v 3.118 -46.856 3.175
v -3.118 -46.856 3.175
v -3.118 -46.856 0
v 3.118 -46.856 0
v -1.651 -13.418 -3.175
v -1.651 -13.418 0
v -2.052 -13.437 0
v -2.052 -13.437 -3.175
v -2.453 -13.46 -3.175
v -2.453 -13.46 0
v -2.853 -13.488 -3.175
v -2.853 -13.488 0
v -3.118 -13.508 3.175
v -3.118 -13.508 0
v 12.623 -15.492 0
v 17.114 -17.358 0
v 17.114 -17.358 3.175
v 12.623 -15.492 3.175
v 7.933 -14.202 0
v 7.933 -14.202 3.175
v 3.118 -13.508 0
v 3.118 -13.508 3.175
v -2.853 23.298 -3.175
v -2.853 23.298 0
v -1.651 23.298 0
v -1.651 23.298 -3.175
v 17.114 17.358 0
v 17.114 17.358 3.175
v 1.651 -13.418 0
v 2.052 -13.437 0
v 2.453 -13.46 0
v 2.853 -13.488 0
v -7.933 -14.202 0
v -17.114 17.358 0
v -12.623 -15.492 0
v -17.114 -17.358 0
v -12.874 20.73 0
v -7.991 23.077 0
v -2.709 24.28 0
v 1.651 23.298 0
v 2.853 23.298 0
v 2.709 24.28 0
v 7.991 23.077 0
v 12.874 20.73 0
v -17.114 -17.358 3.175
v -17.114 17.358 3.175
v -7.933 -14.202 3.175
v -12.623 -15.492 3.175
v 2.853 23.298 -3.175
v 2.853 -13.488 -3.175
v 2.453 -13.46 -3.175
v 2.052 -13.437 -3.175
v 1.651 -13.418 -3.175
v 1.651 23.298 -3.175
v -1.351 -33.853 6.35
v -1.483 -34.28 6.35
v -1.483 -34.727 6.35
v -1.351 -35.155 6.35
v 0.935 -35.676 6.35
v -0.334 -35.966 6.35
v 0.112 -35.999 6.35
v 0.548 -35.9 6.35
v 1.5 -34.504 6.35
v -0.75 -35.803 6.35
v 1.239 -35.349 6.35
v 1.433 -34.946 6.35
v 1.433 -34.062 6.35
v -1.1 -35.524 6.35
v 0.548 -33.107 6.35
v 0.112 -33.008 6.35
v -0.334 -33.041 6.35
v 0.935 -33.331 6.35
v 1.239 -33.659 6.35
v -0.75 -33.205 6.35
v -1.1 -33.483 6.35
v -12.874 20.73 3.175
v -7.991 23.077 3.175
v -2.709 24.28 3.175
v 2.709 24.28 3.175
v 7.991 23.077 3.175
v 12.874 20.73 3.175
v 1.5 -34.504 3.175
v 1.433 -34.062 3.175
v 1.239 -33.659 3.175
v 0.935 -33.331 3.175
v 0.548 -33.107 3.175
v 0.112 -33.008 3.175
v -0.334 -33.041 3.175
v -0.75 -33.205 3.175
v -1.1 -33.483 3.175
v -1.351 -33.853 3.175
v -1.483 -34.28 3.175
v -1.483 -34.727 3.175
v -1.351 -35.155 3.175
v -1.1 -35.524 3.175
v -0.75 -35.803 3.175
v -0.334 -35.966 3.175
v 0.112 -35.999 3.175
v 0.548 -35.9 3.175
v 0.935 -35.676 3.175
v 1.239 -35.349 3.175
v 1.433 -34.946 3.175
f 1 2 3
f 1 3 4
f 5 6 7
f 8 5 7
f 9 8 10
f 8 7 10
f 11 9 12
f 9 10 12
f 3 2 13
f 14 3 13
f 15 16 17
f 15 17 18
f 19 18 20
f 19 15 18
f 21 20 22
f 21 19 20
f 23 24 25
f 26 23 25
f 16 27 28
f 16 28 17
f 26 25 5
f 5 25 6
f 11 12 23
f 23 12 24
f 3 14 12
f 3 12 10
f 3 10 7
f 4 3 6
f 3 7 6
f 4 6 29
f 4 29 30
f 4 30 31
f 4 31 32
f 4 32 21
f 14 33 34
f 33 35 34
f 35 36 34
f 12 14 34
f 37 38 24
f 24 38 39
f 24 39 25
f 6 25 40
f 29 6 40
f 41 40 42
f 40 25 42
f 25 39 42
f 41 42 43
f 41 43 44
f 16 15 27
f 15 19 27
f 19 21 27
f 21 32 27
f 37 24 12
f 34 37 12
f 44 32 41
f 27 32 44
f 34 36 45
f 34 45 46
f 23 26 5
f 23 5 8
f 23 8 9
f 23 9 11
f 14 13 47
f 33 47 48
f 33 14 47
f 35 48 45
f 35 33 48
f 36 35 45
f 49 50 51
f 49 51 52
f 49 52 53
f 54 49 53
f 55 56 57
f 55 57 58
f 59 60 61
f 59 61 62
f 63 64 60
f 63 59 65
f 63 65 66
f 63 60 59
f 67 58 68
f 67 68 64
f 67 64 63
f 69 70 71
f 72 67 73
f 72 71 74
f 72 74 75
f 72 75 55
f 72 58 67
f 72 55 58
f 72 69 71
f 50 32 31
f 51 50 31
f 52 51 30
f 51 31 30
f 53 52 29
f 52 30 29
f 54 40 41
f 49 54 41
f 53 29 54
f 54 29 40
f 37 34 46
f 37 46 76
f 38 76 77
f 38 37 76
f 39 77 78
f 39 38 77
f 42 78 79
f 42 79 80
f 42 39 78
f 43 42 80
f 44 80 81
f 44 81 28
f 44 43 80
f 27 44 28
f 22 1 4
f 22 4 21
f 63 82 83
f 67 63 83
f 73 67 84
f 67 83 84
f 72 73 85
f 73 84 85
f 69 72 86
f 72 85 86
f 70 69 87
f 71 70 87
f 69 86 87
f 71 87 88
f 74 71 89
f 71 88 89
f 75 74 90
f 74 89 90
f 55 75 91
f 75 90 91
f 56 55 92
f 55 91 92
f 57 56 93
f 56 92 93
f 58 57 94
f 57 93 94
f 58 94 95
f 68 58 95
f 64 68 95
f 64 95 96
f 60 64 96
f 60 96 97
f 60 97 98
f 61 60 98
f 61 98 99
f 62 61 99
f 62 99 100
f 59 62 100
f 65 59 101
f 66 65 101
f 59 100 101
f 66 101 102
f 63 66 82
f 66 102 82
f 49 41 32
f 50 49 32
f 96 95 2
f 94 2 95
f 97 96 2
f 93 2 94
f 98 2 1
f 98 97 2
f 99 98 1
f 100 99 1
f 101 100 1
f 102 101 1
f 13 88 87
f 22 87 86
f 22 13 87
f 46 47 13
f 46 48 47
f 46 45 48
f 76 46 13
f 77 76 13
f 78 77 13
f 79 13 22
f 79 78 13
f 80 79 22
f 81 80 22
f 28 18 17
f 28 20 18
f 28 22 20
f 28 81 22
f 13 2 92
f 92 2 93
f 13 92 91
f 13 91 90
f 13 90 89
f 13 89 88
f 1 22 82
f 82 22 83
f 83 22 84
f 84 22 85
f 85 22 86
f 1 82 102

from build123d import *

# Parameters (mm, degrees)
BOSS_EXTRUDE1_DEPTH = 3.175
BOSS_EXTRUDE2_DEPTH = 3.175
SKETCH3_W           = 6.236959702
SKETCH3_H           = 47.194711522
BOSS_EXTRUDE3_DEPTH = 3.175
SKETCH4_R           = 1.5
BOSS_EXTRUDE4_DEPTH = 3.175


with BuildPart() as part:
    # Sketch1 → Boss-Extrude1 (new body)
    with BuildSketch(Plane.XY):
        with BuildLine():
            Line((-17.114253333, -17.357583949), (-17.114253333, 17.357583949))
            ThreePointArc((-17.114253333, 17.357583949), (0, 24.432200125), (17.114253333, 17.357583949))
            Line((17.114253333, 17.357583949), (17.114253333, -17.357583949))
            ThreePointArc((17.114253333, -17.357583949), (0, -13.382802691), (-17.114253333, -17.357583949))
        make_face()
    extrude(amount=BOSS_EXTRUDE1_DEPTH)

    # Sketch2 → Boss-Extrude2 (add)
    with BuildSketch(Plane(origin=(0, 0, 0), x_dir=(-1, 0, 0), z_dir=(0, 0, -1))):
        with BuildLine():
            Line((-1.65128862, -13.417928303), (-1.65128862, 22.268343179))
            Line((-1.65128862, 22.268343179), (-1.65128862, 23.29835294))
            Line((-1.65128862, 23.29835294), (-2.853426735, 23.29835294))
            Line((-2.853426735, 23.29835294), (-2.853426735, -13.48778167))
            ThreePointArc((-2.853426735, -13.48778167), (-2.25262846, -13.448194961), (-1.65128862, -13.417928303))
        make_face()
        with BuildLine():
            Line((1.65128862, 23.29835294), (1.65128862, 22.268343179))
            Line((1.65128862, 22.268343179), (1.65128862, -13.417928303))
            ThreePointArc((1.65128862, -13.417928303), (2.25262846, -13.448194961), (2.853426735, -13.48778167))
            Line((2.853426735, -13.48778167), (2.853426735, 23.29835294))
            Line((2.853426735, 23.29835294), (1.65128862, 23.29835294))
        make_face()
    extrude(amount=BOSS_EXTRUDE2_DEPTH)

    # Sketch3 → Boss-Extrude3 (add)
    with BuildSketch(Plane.XY.offset(3.175)):
        with Locations((0, -23.258467244)):
            Rectangle(SKETCH3_W, SKETCH3_H)
    extrude(amount=-BOSS_EXTRUDE3_DEPTH)

    # Sketch4 → Boss-Extrude4 (add)
    with BuildSketch(Plane.XY.offset(3.175)):
        with Locations((0, -34.503683415)):
            Circle(SKETCH4_R)
    extrude(amount=BOSS_EXTRUDE4_DEPTH)


solid = part.part
